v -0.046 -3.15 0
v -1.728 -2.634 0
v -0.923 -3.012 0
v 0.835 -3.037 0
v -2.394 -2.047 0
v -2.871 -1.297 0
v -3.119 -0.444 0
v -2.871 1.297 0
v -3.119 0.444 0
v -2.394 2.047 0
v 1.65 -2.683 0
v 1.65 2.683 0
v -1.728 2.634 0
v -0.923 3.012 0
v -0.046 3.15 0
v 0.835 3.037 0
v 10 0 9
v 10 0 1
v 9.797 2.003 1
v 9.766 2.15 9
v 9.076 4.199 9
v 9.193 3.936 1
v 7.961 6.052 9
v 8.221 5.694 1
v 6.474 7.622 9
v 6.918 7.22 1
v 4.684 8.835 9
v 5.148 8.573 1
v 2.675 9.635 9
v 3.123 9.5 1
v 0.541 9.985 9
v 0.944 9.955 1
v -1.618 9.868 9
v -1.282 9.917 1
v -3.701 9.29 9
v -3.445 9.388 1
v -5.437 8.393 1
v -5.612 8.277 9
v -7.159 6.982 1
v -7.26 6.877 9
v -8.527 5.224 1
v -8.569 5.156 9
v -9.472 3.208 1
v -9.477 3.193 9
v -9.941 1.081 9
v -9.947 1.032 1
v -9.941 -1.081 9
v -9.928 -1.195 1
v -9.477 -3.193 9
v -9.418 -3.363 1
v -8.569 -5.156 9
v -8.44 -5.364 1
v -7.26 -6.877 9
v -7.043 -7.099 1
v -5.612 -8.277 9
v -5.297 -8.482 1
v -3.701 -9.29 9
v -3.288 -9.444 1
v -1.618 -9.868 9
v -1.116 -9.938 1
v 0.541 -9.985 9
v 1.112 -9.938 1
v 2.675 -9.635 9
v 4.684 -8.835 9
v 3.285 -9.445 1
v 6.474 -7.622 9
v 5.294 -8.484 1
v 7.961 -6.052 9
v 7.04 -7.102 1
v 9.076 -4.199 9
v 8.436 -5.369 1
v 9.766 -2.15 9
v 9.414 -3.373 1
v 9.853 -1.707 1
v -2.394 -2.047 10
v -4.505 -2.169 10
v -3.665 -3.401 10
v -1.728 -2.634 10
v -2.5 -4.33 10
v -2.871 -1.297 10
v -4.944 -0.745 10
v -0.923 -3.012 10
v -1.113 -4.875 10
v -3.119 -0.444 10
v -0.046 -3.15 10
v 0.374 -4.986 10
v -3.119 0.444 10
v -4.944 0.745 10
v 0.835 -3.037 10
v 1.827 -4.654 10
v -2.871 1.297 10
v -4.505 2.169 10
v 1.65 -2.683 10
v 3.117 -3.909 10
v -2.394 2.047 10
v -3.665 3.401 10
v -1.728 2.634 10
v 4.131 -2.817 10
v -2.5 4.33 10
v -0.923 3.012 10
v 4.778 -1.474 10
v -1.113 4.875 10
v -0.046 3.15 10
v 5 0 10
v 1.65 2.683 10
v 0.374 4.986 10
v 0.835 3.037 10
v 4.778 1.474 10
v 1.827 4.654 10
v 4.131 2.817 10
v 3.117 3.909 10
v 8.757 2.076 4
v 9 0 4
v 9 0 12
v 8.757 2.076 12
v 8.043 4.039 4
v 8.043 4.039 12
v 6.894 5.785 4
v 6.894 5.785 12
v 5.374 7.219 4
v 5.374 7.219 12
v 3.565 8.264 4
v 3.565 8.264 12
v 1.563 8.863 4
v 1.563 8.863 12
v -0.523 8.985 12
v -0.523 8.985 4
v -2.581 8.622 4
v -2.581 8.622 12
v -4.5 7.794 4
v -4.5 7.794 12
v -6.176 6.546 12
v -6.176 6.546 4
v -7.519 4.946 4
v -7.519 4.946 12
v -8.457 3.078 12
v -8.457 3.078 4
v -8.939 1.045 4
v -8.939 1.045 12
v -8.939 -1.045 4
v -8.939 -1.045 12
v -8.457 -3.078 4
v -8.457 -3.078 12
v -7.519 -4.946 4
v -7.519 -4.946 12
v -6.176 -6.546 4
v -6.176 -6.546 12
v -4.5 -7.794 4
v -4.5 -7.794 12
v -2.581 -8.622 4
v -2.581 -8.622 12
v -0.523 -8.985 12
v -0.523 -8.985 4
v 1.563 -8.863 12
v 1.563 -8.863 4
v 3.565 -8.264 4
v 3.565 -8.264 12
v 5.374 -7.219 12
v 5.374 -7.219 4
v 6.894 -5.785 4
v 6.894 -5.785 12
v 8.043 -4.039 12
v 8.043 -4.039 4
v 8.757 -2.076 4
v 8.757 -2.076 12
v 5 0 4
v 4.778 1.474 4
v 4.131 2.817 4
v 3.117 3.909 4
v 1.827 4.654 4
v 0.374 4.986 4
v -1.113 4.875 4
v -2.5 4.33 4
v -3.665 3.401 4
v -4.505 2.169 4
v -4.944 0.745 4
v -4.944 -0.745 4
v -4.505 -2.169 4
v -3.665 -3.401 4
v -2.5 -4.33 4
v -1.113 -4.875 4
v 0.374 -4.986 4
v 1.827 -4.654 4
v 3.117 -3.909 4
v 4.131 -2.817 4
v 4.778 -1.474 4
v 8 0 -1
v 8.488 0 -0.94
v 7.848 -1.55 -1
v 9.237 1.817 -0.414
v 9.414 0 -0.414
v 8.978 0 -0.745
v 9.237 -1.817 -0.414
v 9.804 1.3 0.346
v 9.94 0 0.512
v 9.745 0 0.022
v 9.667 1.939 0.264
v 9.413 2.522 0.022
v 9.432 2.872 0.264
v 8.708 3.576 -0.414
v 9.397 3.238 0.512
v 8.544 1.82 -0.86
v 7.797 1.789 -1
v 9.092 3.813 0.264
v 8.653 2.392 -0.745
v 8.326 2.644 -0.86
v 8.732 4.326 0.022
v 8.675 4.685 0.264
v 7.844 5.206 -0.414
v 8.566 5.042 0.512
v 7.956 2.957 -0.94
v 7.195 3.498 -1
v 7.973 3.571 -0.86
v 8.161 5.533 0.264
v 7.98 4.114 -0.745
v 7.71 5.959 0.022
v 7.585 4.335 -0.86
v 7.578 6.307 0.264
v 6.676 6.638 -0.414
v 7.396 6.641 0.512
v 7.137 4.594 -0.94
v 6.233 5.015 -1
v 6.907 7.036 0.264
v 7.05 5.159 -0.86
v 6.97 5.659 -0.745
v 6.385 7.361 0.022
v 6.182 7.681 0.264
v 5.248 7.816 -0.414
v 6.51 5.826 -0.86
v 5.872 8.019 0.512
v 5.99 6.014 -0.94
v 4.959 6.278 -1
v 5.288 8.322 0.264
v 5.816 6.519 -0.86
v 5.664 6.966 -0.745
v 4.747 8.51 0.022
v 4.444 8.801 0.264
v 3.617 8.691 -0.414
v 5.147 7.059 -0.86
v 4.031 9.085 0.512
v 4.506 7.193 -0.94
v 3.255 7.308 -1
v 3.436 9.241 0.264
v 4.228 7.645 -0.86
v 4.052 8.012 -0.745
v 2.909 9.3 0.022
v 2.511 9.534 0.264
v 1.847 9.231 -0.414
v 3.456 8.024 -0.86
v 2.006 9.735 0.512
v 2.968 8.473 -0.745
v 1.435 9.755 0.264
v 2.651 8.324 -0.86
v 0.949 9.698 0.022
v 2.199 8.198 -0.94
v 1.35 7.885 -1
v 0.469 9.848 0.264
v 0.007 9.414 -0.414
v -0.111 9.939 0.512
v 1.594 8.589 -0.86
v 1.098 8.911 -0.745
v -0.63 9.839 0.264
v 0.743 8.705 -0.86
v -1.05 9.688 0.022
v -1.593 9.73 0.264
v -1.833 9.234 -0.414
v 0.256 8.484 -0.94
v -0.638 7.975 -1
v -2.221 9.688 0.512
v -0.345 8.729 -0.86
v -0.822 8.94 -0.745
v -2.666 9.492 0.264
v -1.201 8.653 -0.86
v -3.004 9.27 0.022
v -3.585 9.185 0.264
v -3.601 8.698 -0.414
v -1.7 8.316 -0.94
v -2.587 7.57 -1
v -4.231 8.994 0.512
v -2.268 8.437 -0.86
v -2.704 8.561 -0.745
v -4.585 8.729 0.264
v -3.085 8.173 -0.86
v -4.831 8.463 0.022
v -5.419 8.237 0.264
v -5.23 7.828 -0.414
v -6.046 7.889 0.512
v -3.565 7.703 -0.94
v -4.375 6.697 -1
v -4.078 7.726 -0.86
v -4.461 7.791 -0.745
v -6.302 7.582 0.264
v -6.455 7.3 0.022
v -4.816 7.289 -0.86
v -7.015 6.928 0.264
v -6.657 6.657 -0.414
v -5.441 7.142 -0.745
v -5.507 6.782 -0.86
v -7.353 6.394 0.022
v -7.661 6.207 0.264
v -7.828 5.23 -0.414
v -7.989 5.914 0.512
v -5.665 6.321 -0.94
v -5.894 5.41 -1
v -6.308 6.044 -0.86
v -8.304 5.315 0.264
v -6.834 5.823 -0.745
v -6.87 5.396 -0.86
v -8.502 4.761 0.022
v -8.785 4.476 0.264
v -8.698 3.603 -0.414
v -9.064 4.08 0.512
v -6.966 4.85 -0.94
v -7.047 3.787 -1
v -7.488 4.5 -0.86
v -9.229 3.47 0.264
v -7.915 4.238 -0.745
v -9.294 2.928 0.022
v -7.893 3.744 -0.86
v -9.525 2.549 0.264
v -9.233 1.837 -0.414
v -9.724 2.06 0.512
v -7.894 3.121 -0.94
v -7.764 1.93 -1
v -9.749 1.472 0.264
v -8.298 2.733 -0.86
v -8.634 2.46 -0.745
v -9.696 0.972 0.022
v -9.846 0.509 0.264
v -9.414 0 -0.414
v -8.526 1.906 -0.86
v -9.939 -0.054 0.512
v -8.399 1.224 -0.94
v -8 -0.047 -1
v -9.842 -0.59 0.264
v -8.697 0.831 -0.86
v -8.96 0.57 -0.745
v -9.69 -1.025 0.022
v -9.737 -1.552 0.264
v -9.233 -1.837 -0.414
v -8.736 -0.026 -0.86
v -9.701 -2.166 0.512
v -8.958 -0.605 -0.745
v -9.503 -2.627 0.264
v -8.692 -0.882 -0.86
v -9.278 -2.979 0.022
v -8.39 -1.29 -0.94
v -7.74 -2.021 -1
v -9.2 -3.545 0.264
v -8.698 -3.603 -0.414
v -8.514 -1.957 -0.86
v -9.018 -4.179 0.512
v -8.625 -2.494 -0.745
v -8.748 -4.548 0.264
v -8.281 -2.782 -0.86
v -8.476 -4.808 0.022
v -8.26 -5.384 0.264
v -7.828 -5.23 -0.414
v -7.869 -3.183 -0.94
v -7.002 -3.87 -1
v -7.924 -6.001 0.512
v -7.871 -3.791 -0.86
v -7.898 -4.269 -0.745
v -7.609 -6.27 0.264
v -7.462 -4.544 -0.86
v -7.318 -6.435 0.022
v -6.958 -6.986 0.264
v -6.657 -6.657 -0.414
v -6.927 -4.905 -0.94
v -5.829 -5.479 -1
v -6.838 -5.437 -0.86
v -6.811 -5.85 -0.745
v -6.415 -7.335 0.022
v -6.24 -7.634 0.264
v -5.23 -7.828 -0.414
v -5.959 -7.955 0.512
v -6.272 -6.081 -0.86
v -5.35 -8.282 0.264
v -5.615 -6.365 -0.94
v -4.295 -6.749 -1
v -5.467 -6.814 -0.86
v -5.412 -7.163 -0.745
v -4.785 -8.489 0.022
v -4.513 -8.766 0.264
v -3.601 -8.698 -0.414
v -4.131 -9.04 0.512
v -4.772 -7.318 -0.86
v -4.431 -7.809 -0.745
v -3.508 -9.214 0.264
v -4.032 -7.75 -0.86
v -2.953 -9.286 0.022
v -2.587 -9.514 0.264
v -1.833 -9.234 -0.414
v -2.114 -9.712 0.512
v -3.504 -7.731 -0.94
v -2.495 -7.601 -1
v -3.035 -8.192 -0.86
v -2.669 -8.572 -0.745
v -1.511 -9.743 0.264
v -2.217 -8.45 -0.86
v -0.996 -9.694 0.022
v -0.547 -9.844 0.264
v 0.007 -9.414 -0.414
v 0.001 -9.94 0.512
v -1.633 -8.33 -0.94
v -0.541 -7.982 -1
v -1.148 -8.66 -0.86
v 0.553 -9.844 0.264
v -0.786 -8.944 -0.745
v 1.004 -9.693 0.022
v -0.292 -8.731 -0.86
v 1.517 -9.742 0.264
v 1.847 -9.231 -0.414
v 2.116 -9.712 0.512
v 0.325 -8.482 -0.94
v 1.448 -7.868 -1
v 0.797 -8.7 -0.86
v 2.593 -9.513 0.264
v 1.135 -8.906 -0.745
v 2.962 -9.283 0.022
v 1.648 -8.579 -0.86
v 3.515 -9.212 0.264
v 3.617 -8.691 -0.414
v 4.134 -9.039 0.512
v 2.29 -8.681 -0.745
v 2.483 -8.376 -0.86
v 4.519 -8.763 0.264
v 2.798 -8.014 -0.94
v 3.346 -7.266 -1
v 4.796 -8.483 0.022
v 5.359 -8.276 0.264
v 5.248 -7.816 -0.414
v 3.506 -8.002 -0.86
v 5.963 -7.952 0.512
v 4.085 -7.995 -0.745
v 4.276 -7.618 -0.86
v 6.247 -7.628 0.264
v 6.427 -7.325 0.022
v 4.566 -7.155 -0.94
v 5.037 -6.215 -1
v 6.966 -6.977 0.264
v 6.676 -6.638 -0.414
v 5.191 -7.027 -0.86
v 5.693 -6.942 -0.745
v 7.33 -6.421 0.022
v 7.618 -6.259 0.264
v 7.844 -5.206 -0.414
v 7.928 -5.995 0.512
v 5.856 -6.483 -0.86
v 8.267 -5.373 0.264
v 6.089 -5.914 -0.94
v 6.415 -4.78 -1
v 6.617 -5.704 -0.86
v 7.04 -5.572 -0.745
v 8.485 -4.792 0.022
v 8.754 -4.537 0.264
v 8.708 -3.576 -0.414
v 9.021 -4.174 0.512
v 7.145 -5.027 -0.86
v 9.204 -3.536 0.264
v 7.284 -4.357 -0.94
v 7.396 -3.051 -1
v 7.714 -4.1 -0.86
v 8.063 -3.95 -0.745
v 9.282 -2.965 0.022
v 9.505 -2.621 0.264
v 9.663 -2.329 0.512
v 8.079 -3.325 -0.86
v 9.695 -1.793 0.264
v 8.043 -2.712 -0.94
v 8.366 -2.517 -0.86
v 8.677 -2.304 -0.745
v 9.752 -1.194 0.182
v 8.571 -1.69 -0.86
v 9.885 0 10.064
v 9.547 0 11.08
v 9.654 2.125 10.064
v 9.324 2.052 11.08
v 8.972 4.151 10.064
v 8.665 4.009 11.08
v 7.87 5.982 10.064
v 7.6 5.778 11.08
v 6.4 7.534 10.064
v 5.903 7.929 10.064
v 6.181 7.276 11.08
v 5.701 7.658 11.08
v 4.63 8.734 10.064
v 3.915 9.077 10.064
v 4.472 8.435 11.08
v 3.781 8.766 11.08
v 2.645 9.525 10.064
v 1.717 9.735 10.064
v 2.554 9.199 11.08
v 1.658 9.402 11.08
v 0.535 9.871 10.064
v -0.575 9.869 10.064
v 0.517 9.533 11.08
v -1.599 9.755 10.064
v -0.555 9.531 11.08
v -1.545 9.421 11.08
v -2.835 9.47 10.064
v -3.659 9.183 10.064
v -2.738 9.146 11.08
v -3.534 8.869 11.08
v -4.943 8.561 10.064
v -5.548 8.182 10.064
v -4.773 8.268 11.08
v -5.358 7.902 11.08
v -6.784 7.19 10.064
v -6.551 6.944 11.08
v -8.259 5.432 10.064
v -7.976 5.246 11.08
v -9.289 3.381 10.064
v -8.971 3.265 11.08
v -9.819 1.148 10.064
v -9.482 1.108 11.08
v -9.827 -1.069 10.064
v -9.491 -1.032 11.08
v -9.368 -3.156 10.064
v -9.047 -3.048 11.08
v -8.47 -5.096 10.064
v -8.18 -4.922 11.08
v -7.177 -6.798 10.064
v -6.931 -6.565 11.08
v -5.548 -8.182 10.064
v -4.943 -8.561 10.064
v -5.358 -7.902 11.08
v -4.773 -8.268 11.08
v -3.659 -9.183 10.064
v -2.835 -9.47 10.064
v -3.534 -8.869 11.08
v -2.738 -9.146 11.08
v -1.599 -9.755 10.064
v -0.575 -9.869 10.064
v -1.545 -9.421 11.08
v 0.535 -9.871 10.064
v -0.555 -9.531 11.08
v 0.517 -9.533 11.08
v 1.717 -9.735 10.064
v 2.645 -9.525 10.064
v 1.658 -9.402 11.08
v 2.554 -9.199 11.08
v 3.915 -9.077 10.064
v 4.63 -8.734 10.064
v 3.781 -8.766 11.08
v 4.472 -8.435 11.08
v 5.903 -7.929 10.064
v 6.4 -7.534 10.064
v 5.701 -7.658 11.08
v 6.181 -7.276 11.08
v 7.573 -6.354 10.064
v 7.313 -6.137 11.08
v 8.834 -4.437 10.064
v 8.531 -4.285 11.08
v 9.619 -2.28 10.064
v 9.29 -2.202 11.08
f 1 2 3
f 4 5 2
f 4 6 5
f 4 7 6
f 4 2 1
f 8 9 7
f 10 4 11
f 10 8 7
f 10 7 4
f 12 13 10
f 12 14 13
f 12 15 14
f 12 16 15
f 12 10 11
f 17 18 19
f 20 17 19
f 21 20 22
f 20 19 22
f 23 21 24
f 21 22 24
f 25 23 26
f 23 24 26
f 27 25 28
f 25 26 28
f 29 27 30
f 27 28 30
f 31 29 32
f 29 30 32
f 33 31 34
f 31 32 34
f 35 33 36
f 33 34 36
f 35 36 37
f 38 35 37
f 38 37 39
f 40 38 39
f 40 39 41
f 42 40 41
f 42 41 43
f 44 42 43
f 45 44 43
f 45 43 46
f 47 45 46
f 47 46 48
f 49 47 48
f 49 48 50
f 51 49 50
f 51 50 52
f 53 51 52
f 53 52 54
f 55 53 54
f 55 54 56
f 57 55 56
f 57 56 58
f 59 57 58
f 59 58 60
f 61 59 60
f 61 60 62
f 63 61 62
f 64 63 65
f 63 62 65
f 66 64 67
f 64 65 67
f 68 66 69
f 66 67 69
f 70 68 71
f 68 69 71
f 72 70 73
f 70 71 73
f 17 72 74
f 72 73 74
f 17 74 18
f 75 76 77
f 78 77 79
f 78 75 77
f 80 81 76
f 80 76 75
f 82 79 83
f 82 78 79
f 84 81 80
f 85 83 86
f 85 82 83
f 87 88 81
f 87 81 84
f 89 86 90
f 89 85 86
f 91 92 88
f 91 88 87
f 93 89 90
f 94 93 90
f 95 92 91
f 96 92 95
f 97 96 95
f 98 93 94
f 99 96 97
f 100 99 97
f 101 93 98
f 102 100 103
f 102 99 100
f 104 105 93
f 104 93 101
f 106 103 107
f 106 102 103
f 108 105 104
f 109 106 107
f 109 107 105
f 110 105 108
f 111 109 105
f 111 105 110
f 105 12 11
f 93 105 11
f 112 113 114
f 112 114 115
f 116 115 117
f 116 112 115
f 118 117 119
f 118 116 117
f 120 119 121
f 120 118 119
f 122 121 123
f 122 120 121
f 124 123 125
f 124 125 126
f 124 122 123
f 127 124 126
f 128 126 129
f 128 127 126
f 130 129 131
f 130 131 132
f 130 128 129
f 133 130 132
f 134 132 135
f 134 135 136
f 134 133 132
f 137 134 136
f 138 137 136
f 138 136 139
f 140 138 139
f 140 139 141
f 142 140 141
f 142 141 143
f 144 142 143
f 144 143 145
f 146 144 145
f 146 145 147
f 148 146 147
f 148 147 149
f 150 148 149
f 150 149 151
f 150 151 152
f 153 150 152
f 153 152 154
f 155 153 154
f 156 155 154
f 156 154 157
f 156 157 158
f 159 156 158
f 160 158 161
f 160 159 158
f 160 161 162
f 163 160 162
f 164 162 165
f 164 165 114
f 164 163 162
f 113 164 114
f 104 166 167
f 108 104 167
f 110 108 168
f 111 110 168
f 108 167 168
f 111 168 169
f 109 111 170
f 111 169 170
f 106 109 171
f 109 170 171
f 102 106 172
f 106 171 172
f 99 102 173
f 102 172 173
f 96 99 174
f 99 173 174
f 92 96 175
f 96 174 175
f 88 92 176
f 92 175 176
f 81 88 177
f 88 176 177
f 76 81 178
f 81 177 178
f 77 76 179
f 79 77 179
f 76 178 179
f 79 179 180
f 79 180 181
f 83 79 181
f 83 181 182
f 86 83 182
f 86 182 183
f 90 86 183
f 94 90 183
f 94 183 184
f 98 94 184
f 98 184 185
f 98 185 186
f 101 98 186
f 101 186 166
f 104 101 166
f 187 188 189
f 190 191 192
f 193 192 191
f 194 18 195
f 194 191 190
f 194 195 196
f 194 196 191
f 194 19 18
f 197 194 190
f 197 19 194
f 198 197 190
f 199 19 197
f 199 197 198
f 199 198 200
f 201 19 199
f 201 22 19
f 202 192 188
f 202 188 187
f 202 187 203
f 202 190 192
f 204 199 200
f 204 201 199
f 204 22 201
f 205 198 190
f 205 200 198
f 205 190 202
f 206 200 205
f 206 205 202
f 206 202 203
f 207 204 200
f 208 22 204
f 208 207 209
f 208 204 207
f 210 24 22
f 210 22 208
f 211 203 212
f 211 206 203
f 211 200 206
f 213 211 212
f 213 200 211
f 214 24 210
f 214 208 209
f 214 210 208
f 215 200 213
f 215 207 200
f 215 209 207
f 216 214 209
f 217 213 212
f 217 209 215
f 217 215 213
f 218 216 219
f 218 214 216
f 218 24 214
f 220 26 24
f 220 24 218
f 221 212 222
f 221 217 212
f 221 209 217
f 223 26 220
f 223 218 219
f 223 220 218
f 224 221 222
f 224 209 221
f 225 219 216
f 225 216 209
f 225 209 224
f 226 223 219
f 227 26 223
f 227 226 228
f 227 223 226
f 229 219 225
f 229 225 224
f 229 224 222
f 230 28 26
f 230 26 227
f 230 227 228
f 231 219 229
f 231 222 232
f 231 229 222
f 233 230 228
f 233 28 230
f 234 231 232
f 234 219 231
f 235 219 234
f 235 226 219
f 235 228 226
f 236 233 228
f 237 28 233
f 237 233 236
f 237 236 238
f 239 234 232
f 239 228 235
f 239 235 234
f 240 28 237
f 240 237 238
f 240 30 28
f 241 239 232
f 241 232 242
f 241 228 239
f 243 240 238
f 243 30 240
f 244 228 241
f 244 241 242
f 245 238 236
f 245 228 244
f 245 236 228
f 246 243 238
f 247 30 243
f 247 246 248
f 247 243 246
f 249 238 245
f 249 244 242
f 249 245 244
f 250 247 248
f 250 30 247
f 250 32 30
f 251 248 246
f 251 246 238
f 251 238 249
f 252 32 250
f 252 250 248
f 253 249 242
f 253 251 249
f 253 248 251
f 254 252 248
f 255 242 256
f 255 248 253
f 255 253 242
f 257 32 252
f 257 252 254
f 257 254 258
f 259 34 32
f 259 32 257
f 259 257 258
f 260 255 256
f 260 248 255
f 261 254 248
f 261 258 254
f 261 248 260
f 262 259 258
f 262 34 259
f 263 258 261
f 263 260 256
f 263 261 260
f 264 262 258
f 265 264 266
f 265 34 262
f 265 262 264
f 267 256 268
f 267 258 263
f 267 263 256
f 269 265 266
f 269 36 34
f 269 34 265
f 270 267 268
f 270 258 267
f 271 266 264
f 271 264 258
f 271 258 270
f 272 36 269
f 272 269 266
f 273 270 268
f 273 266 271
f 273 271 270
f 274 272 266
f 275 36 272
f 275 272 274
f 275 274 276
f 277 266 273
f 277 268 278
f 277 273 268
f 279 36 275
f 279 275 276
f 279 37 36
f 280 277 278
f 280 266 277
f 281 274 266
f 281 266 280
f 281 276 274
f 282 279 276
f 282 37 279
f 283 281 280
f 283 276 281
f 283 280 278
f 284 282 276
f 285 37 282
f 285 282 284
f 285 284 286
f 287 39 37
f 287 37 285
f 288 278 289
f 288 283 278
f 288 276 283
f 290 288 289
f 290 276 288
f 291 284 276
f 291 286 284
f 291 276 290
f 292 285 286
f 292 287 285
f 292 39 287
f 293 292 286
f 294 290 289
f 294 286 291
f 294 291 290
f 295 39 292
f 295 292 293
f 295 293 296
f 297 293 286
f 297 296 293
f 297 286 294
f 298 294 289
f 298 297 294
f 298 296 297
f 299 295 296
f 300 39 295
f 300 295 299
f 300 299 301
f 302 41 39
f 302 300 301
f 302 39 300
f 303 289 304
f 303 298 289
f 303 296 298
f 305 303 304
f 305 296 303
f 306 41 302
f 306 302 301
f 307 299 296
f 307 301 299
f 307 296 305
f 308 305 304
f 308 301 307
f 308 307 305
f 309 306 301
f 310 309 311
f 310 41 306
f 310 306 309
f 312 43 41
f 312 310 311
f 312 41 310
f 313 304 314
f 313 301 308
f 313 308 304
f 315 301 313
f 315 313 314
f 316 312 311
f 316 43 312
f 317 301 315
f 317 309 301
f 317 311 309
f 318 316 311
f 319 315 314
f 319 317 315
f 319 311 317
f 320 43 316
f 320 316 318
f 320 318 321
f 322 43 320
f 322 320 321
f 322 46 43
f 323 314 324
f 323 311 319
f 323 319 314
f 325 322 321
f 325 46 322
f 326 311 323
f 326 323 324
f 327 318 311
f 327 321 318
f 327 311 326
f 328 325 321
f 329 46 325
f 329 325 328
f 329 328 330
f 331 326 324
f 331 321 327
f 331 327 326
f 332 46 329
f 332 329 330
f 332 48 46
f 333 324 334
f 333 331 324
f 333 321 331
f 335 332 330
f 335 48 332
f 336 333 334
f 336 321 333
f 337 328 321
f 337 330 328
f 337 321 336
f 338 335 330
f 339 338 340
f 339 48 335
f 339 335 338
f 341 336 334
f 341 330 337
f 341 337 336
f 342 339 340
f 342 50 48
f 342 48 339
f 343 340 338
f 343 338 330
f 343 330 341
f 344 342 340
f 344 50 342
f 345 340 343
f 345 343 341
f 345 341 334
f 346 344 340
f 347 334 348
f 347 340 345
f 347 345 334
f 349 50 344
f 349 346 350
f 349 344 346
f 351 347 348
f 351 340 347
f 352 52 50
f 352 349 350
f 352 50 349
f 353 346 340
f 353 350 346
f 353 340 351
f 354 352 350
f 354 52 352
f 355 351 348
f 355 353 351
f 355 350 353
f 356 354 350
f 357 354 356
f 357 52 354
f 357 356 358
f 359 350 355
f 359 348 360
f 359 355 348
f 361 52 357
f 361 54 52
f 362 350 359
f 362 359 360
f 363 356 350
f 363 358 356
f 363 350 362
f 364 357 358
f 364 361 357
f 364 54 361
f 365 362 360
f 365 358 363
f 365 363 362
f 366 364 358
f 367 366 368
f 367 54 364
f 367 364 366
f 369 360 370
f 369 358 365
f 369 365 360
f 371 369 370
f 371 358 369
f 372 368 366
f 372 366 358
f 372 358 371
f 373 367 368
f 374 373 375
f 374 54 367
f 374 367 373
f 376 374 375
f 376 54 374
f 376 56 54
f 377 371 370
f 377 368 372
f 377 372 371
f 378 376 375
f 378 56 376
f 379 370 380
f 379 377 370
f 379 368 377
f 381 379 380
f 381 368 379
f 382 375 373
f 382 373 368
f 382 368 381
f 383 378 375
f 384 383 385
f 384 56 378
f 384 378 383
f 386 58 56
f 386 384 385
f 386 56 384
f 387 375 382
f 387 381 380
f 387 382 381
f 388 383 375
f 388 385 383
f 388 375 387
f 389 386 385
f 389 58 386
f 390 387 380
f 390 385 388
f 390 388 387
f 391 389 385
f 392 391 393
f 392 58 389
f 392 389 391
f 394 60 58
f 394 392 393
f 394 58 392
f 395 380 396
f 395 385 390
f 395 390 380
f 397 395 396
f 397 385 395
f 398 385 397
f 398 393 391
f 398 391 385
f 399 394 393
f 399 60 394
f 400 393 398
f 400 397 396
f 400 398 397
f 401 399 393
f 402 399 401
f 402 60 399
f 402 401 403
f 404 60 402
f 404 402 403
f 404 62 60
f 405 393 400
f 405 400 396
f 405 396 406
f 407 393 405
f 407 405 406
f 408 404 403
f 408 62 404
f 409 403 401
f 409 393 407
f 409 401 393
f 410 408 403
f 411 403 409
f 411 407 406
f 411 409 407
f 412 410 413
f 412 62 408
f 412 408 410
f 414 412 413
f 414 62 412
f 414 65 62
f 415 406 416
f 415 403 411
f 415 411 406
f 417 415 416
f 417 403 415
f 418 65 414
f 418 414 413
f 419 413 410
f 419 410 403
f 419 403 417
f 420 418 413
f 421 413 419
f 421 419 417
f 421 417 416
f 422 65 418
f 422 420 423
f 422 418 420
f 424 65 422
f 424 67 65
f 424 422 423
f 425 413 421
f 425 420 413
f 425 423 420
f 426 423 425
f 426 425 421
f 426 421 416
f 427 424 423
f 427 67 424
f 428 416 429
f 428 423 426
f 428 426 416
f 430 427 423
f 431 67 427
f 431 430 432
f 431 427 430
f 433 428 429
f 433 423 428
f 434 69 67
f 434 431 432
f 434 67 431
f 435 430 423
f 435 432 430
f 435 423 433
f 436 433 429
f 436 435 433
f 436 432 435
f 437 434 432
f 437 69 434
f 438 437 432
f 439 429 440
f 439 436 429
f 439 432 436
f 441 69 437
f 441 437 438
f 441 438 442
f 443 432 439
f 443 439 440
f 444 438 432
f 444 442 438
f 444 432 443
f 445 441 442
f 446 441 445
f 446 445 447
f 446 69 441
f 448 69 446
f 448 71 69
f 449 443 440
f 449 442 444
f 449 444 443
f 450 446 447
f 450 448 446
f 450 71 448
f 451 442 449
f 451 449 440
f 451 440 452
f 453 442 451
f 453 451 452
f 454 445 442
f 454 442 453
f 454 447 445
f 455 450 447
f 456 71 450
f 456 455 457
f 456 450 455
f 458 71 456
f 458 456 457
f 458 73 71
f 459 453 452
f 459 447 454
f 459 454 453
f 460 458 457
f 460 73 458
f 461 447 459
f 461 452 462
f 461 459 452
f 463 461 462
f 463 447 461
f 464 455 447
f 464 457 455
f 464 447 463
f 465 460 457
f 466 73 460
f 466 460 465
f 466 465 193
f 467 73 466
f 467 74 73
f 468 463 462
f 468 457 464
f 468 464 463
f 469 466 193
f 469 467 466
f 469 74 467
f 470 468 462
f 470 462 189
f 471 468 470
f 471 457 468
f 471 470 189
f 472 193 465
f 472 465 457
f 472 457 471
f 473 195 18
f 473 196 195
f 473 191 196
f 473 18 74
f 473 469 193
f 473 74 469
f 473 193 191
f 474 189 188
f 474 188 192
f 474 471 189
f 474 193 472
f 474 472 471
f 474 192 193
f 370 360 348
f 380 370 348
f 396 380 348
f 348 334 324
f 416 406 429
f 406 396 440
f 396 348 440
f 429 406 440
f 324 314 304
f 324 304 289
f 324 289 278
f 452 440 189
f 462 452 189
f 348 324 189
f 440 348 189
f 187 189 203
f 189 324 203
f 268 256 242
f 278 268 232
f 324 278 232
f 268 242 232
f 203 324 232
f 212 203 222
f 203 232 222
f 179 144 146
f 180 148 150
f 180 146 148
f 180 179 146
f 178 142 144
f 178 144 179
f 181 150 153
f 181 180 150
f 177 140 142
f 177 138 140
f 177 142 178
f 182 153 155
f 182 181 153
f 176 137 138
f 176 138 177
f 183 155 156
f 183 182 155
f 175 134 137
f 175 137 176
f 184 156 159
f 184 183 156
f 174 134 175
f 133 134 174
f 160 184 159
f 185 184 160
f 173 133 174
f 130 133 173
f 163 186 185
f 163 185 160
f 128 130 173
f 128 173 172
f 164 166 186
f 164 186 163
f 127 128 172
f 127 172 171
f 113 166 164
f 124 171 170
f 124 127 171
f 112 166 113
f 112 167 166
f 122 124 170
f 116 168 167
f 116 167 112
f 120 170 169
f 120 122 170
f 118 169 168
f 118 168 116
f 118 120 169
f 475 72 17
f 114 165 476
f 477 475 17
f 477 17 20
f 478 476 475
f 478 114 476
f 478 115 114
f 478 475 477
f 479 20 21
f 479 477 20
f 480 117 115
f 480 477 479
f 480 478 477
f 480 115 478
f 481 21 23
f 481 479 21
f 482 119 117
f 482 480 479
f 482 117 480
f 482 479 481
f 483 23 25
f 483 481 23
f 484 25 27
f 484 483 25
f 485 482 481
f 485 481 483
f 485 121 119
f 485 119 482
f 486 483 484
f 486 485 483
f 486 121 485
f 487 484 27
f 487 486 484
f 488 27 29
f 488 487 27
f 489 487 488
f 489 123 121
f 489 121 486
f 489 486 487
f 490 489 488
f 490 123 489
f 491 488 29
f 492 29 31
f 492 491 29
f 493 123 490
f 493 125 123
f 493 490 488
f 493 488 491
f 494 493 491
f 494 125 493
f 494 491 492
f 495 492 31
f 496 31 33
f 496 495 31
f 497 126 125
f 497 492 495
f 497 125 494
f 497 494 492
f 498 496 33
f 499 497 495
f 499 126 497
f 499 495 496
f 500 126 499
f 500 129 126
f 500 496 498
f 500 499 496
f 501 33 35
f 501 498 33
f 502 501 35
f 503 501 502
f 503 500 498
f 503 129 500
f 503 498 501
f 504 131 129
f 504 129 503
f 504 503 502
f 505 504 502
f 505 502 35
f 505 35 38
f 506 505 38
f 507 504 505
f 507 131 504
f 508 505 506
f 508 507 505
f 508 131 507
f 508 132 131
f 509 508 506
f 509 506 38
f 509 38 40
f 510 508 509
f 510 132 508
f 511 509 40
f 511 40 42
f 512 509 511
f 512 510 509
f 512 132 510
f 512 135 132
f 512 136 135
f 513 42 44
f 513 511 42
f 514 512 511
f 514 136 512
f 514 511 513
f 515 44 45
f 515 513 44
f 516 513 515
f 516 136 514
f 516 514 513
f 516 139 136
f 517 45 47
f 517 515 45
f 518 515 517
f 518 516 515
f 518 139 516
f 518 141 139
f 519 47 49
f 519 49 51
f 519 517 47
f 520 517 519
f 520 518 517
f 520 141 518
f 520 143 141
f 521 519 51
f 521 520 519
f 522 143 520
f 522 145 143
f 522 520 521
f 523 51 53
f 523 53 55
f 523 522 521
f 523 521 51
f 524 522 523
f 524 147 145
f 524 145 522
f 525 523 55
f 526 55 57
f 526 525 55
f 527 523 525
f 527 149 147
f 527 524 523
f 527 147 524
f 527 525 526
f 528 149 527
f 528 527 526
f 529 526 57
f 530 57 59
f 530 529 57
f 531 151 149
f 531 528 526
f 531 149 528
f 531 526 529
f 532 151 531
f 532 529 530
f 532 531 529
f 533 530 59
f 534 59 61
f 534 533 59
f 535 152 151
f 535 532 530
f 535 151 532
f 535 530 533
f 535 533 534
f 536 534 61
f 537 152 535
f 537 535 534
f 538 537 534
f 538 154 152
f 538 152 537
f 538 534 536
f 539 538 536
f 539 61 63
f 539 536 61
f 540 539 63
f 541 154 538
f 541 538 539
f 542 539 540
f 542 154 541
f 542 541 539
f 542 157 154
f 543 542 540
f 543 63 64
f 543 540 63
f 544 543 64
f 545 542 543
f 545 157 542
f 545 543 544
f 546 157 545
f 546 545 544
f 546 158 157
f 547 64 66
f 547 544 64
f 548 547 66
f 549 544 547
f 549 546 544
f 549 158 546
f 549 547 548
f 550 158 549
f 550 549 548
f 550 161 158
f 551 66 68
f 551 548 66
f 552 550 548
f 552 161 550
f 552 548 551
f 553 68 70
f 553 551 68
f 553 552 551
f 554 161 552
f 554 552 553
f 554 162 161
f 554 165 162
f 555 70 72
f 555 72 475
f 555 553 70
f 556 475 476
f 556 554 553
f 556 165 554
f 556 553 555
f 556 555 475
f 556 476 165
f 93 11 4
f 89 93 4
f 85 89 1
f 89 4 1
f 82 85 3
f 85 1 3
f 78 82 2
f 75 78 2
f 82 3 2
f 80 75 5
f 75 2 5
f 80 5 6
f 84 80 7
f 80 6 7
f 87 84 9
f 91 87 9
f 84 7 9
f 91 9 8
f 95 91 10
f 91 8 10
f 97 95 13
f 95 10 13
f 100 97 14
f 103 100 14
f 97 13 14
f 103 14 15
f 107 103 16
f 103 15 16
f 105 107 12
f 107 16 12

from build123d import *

# Parameters (mm, degrees)
F0_R     = 10
F0_R_2   = 5
F1_DEPTH = 4
F2_R     = 10
F2_R_2   = 9
F3_DEPTH = 12
F5_R     = 10
F6_DEPTH = 1
F7_R     = 2
F8_DEPTH = 10


# Not quite as in the source:
# - a fillet or chamfer that OpenCascade refuses, or shapes differently, is made with other operations: its cross-section is extruded or revolved along the edge and cut away or added


with BuildPart() as f1:
    # F0 (on Top) → F1 (new body)
    with BuildSketch(Plane.XY):
        Circle(F0_R)
        Circle(F0_R_2, mode=Mode.SUBTRACT)
    extrude(amount=F1_DEPTH)

    # F2 (on Top) → F3 (join)
    with BuildSketch(Plane.XY):
        Circle(F2_R)
        Circle(F2_R_2, mode=Mode.SUBTRACT)
    extrude(amount=F3_DEPTH)

    # F4: fillet of radius 5 on 1 edges, made by hand

    # F4_s1 → F4_t2 (revolve, cut)
    with BuildSketch(Plane.XZ):
        with BuildLine():
            ThreePointArc((10, 9), (9.7434164903, 10.5811388301), (9, 12))
            Line((9, 12), (10, 12))
            Line((10, 12), (10, 9))
        make_face()
    revolve(axis=Axis((0, 0, 12), (0, 0, 1)), mode=Mode.SUBTRACT)

    # F5 (on face) → F6 (join)
    with BuildSketch(Plane.XY):
        Circle(F5_R)
    extrude(amount=-F6_DEPTH)

    # F7
    f7_edges = [f1.edges().sort_by_distance(p)[0] for p in [
        (-10, 0, -1),
    ]]
    fillet(f7_edges, radius=F7_R)

    # F0 (on Top) → F8 (join)
    with BuildSketch(Plane.XY):
        Circle(F0_R_2)
        with BuildLine():
            ThreePointArc((1.65, -2.683281573), (-3.15, 0), (1.65, 2.683281573))
            Line((1.65, 2.683281573), (1.65, -2.683281573))
        make_face(mode=Mode.SUBTRACT)
    extrude(amount=F8_DEPTH)


solid = f1.part
